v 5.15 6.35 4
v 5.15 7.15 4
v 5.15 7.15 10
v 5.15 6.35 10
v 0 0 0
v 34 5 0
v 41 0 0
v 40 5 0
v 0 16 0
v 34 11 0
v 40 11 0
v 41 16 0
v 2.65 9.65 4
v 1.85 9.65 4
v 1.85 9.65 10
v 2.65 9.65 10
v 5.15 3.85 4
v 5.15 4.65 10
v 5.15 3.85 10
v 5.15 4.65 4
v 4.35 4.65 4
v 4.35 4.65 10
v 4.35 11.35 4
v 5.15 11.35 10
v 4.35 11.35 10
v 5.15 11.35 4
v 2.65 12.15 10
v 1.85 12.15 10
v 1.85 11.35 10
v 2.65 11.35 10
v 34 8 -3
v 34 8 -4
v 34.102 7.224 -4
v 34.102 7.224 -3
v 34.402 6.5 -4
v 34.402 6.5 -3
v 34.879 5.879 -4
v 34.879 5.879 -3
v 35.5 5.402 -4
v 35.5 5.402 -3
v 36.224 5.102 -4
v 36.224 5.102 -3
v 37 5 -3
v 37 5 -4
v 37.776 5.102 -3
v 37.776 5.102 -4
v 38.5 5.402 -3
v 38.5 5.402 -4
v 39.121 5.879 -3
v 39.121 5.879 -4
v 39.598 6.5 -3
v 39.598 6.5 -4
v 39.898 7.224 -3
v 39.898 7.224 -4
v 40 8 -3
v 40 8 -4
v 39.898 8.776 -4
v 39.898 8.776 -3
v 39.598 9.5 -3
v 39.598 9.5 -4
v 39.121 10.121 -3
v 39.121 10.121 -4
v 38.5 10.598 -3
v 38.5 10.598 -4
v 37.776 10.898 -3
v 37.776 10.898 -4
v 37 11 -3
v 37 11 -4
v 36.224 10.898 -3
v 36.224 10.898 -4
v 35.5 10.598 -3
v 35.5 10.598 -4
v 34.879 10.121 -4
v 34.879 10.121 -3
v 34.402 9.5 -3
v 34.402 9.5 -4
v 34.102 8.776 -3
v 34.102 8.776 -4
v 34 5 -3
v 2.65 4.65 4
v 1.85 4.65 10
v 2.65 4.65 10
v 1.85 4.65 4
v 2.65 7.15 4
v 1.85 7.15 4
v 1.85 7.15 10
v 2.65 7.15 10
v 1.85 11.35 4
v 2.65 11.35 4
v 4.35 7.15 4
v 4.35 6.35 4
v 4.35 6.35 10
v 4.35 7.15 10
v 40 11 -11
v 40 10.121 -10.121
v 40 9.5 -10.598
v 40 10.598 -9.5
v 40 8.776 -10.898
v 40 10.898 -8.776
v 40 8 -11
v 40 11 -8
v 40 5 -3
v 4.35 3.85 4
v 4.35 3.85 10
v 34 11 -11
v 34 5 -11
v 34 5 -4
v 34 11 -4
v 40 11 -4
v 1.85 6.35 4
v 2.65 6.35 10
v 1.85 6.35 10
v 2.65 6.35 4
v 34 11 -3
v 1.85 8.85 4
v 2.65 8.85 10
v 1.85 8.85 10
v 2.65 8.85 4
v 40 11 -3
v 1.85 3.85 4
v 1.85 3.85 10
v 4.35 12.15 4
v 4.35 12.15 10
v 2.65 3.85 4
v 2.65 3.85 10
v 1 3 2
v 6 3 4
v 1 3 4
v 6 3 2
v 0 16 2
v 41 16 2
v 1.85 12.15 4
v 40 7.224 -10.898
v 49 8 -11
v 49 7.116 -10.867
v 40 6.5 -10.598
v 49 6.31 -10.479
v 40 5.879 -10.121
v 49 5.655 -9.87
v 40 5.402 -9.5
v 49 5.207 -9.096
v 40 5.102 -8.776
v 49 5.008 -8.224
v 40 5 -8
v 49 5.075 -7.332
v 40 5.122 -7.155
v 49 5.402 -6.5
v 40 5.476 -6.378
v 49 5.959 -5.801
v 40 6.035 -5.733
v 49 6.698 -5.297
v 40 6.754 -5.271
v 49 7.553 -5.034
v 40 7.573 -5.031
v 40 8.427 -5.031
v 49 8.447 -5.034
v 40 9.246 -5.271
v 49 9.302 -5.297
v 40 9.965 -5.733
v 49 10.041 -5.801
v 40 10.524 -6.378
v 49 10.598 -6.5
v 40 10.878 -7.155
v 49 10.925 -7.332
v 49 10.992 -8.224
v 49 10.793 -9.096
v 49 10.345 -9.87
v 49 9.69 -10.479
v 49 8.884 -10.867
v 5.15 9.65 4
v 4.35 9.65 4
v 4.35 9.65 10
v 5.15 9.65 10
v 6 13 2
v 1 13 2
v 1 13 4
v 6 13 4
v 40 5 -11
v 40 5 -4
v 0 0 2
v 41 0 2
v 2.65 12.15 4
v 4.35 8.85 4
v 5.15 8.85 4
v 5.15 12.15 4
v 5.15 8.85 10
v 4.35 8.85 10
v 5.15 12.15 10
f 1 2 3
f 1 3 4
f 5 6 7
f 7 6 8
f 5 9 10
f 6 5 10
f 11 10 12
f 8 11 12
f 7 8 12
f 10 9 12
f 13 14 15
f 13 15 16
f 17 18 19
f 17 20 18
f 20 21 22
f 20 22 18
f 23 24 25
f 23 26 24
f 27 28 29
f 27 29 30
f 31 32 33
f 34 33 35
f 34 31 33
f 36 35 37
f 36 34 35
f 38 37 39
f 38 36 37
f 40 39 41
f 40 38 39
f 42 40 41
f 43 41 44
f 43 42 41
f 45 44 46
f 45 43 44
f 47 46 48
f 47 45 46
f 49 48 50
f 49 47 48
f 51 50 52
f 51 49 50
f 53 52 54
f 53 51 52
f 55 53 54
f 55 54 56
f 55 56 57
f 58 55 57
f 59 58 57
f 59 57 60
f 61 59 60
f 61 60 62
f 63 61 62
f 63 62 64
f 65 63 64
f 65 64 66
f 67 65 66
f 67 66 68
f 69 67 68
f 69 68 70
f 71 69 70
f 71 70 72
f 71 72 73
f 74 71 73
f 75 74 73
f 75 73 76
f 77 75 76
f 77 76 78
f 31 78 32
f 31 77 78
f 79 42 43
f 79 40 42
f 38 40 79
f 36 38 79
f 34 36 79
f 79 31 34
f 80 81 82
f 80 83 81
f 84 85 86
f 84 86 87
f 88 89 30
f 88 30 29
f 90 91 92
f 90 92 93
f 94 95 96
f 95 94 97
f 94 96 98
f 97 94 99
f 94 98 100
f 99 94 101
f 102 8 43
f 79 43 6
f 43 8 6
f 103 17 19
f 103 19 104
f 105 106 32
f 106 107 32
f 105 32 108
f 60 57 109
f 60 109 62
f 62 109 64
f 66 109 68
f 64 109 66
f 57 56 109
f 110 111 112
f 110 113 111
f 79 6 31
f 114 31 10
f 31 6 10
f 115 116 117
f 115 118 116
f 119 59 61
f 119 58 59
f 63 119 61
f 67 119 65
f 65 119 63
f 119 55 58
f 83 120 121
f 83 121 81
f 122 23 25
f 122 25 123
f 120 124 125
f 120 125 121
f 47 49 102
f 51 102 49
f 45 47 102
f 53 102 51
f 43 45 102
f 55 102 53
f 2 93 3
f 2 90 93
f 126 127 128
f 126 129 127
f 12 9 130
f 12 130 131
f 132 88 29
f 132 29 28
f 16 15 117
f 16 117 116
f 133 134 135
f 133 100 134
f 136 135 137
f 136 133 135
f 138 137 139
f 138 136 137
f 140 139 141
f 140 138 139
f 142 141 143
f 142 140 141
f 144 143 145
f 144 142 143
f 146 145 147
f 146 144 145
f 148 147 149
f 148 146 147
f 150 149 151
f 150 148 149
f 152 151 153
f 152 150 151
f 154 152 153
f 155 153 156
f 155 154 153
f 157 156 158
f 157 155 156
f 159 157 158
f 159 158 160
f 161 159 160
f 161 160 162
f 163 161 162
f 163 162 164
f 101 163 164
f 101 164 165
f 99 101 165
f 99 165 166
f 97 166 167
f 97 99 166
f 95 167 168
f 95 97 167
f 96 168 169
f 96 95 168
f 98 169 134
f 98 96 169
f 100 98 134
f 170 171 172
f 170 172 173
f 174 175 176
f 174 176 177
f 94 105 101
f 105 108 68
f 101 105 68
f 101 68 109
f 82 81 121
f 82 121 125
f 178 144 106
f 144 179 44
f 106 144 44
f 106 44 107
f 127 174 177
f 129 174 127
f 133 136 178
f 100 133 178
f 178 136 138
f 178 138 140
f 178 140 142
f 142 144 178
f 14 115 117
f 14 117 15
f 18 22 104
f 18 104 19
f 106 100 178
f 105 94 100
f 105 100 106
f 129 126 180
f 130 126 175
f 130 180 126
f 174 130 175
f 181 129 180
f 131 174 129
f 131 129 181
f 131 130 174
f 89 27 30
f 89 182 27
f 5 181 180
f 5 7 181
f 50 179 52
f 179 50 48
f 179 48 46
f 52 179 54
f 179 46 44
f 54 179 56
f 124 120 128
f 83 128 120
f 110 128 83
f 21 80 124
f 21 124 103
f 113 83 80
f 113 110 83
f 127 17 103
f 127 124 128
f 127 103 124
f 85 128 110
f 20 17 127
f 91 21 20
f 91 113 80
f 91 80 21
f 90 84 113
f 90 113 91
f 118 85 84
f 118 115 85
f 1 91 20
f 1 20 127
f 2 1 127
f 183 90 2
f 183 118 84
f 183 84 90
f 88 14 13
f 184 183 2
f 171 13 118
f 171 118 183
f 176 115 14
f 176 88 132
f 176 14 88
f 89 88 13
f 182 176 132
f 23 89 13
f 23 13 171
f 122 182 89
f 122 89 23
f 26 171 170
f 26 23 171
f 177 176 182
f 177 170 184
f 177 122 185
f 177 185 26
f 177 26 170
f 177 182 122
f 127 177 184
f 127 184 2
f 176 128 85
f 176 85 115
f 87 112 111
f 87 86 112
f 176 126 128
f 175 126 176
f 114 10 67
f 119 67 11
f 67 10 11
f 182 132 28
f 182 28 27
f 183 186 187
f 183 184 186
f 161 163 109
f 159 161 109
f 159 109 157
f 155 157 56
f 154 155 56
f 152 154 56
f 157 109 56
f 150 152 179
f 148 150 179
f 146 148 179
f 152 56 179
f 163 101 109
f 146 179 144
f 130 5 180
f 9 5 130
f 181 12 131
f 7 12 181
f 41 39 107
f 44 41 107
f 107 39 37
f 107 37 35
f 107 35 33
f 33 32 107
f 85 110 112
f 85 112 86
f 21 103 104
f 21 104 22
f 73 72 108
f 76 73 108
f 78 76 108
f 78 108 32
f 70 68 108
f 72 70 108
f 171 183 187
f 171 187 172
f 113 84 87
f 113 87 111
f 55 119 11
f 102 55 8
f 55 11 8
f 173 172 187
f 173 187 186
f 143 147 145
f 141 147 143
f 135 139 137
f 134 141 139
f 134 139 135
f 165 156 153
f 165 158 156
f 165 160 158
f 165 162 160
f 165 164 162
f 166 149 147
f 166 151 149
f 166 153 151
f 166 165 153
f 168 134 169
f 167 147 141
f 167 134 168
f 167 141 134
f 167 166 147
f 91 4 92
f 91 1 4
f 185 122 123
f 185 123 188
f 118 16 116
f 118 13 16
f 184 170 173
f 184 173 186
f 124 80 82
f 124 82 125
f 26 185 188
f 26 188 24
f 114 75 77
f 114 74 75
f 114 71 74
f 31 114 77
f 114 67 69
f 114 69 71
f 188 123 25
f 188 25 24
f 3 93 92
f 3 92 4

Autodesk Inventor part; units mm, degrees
ref_plane "YZ Plane" through (0, 0, 0) normal (1, 0, 0) x (0, 1, 0)
ref_plane "XZ Plane" through (0, 0, 0) normal (0, 1, 0) x (-1, 0, 0)
ref_plane "XY Plane" through (0, 0, 0) normal (0, 0, 1) x (1, 0, 0)
sketch "Esquisse1" plane through (0, 0, 0) normal (0, 0, 1) x (1, 0, 0)
  line L0 (0, 16) -> (41, 16)
  line L1 (41, 16) -> (41, 0)
  line L2 (41, 0) -> (0, 0)
  line L3 (0, 0) -> (0, 16)
  line L4 (0, -3.2) -> (0, 19.2) projected
  line L5 (-8.2, 0) -> (49.2, 0) projected
  point P0 (0, 0)
  dimension "d0" = 16
  dimension "d1" = 41
extrude "Extrusion1" add sketch "Esquisse1" along normal blind 2
sketch "Esquisse2" plane through (0, 0, 2) normal (0, 0, 1) x (1, 0, 0)
  line L0 (1, 13) -> (3.5, 13)
  line L1 (3.5, 13) -> (3.5, 10.5)
  line L2 (3.5, 10.5) -> (1, 10.5)
  line L3 (1, 10.5) -> (1, 13)
  line L4 (3.5, 13) -> (6, 13)
  line L5 (6, 13) -> (6, 10.5)
  line L6 (6, 10.5) -> (3.5, 10.5)
  line L7 (3.5, 10.5) -> (3.5, 13)
  line L8 (0, -3.2) -> (0, 19.2) projected
  line L9 (1, 8) -> (1, 10.5)
  line L10 (1, 10.5) -> (3.5, 10.5)
  line L11 (3.5, 10.5) -> (3.5, 8)
  line L12 (3.5, 10.5) -> (6, 10.5)
  line L13 (6, 10.5) -> (6, 8)
  line L14 (6, 8) -> (3.5, 8)
  line L15 (3.5, 8) -> (1, 8)
  line L16 (1, 5.5) -> (1, 8)
  line L17 (1, 8) -> (3.5, 8)
  line L18 (3.5, 8) -> (3.5, 5.5)
  line L19 (3.5, 8) -> (6, 8)
  line L20 (6, 8) -> (6, 5.5)
  line L21 (6, 5.5) -> (3.5, 5.5)
  line L22 (3.5, 5.5) -> (1, 5.5)
  line L23 (1, 3) -> (1, 5.5)
  line L24 (1, 5.5) -> (3.5, 5.5)
  line L25 (3.5, 5.5) -> (3.5, 3)
  line L26 (3.5, 5.5) -> (6, 5.5)
  line L27 (6, 5.5) -> (6, 3)
  line L28 (6, 3) -> (3.5, 3)
  line L29 (3.5, 3) -> (1, 3)
  line L30 (41, 16) -> (0, 16) projected
  point P0 (0, 0)
  dimension "d4" = 2.5
  dimension "d5" = 2.5
  dimension "d8" = 2.5
  dimension "d9" = 2.5
  dimension "d12" = 2.5
  dimension "d17" = 3
  dimension "d18" = 1
extrude "Extrusion2" add sketch "Esquisse2" along normal blind 2
sketch "Esquisse3" plane through (0, 0, 4) normal (0, 0, 1) x (1, 0, 0)
  line L0 (1.85, 12.15) -> (2.65, 12.15)
  line L1 (2.65, 12.15) -> (2.65, 11.35)
  line L2 (2.65, 11.35) -> (1.85, 11.35)
  line L3 (1.85, 11.35) -> (1.85, 12.15)
  line L4 (6, 13) -> (1, 13) projected
  line L5 (1, 13) -> (1, 3) projected
  line L6 (2.65, 9.65) -> (2.65, 8.85)
  line L7 (1.85, 9.65) -> (2.65, 9.65)
  line L8 (1.85, 8.85) -> (1.85, 9.65)
  line L9 (2.65, 8.85) -> (1.85, 8.85)
  line L10 (2.65, 7.15) -> (2.65, 6.35)
  line L11 (1.85, 7.15) -> (2.65, 7.15)
  line L12 (1.85, 6.35) -> (1.85, 7.15)
  line L13 (2.65, 6.35) -> (1.85, 6.35)
  line L14 (2.65, 4.65) -> (2.65, 3.85)
  line L15 (1.85, 4.65) -> (2.65, 4.65)
  line L16 (1.85, 3.85) -> (1.85, 4.65)
  line L17 (2.65, 3.85) -> (1.85, 3.85)
  line L18 (5.15, 12.15) -> (5.15, 11.35)
  line L19 (4.35, 12.15) -> (5.15, 12.15)
  line L20 (4.35, 11.35) -> (4.35, 12.15)
  line L21 (5.15, 11.35) -> (4.35, 11.35)
  line L22 (5.15, 9.65) -> (5.15, 8.85)
  line L23 (4.35, 9.65) -> (5.15, 9.65)
  line L24 (4.35, 8.85) -> (4.35, 9.65)
  line L25 (5.15, 8.85) -> (4.35, 8.85)
  line L26 (5.15, 7.15) -> (5.15, 6.35)
  line L27 (4.35, 7.15) -> (5.15, 7.15)
  line L28 (4.35, 6.35) -> (4.35, 7.15)
  line L29 (5.15, 6.35) -> (4.35, 6.35)
  line L30 (5.15, 4.65) -> (5.15, 3.85)
  line L31 (4.35, 4.65) -> (5.15, 4.65)
  line L32 (4.35, 3.85) -> (4.35, 4.65)
  line L33 (5.15, 3.85) -> (4.35, 3.85)
  point P0 (0, 0)
  dimension "d21" = 0.8
  dimension "d22" = 0.8
  dimension "d23" = 0.85
  dimension "d24" = 0.85
  dimension "d27" = 2.5
  dimension "d30" = 2.5
extrude "Extrusion3" add sketch "Esquisse3" along normal blind 6
sketch "Esquisse4" plane through (0, 0, 0) normal (0, 0, -1) x (-1, 0, 0)
  line L0 (-40, 5) -> (-34, 5)
  line L1 (-34, 5) -> (-34, 11)
  line L2 (-34, 11) -> (-40, 11)
  line L3 (-40, 11) -> (-40, 5)
  line L4 (-41, 0) -> (-41, 16) projected
  line L5 (0, 0) -> (-41, 0) projected
  dimension "d35" = 6
  dimension "d36" = 6
  dimension "d37" = 1
  dimension "d38" = 5
extrude "Extrusion4" add sketch "Esquisse4" along normal blind 3
sketch "Esquisse5" plane through (0, 0, -3) normal (0, 0, -1) x (-1, 0, 0)
  circle A0 centre (-37, 8) radius 3
  line L0 (-34, 11) -> (-40, 11) projected
  line L1 (-40, 11) -> (-40, 5) projected
  line L2 (-34, 5) -> (-34, 11) projected
  point P0 (0, 0)
extrude "Extrusion5" add sketch "Esquisse5" along normal blind 1 contours A0
sketch "Esquisse6" plane through (37, 8, -4) normal (0, 0, -1) x (-1, 0, 0)
  line L0 (-3, -3) -> (3, -3)
  line L1 (3, -3) -> (3, 3)
  line L2 (3, 3) -> (-3, 3)
  line L3 (-3, 3) -> (-3, -3)
  line L4 (0, 3) -> (-3, 3) projected
  line L5 (-3, 0) -> (-3, -3) projected
  line L6 (-3, -3) -> (0, -3) projected
  line L7 (3, -3) -> (3, 0) projected
  point P0 (37, -8)
extrude "Extrusion6" add sketch "Esquisse6" along normal blind 7
sketch "Esquisse7" plane through (40, 8, -4) normal (1, 0, 0) x (0, 0, -1)
  circle A0 centre (4, 0) radius 3
  line L0 (7, 3) -> (7, -3) projected
  line L1 (0, -3) -> (7, -3) projected
  line L2 (0, 3) -> (7, 3) projected
  point P0 (-4, -8)
extrude "Extrusion7" add sketch "Esquisse7" along normal blind 9 contours A0
equation "\"d5\" = d4"
equation "\"d8\" = d4"
equation "\"d9\" = d5"
equation "\"d22\" = d21"
equation "\"d24\" = d23"
equation "\"d36\" = d35"
properties part number "nrf24"
